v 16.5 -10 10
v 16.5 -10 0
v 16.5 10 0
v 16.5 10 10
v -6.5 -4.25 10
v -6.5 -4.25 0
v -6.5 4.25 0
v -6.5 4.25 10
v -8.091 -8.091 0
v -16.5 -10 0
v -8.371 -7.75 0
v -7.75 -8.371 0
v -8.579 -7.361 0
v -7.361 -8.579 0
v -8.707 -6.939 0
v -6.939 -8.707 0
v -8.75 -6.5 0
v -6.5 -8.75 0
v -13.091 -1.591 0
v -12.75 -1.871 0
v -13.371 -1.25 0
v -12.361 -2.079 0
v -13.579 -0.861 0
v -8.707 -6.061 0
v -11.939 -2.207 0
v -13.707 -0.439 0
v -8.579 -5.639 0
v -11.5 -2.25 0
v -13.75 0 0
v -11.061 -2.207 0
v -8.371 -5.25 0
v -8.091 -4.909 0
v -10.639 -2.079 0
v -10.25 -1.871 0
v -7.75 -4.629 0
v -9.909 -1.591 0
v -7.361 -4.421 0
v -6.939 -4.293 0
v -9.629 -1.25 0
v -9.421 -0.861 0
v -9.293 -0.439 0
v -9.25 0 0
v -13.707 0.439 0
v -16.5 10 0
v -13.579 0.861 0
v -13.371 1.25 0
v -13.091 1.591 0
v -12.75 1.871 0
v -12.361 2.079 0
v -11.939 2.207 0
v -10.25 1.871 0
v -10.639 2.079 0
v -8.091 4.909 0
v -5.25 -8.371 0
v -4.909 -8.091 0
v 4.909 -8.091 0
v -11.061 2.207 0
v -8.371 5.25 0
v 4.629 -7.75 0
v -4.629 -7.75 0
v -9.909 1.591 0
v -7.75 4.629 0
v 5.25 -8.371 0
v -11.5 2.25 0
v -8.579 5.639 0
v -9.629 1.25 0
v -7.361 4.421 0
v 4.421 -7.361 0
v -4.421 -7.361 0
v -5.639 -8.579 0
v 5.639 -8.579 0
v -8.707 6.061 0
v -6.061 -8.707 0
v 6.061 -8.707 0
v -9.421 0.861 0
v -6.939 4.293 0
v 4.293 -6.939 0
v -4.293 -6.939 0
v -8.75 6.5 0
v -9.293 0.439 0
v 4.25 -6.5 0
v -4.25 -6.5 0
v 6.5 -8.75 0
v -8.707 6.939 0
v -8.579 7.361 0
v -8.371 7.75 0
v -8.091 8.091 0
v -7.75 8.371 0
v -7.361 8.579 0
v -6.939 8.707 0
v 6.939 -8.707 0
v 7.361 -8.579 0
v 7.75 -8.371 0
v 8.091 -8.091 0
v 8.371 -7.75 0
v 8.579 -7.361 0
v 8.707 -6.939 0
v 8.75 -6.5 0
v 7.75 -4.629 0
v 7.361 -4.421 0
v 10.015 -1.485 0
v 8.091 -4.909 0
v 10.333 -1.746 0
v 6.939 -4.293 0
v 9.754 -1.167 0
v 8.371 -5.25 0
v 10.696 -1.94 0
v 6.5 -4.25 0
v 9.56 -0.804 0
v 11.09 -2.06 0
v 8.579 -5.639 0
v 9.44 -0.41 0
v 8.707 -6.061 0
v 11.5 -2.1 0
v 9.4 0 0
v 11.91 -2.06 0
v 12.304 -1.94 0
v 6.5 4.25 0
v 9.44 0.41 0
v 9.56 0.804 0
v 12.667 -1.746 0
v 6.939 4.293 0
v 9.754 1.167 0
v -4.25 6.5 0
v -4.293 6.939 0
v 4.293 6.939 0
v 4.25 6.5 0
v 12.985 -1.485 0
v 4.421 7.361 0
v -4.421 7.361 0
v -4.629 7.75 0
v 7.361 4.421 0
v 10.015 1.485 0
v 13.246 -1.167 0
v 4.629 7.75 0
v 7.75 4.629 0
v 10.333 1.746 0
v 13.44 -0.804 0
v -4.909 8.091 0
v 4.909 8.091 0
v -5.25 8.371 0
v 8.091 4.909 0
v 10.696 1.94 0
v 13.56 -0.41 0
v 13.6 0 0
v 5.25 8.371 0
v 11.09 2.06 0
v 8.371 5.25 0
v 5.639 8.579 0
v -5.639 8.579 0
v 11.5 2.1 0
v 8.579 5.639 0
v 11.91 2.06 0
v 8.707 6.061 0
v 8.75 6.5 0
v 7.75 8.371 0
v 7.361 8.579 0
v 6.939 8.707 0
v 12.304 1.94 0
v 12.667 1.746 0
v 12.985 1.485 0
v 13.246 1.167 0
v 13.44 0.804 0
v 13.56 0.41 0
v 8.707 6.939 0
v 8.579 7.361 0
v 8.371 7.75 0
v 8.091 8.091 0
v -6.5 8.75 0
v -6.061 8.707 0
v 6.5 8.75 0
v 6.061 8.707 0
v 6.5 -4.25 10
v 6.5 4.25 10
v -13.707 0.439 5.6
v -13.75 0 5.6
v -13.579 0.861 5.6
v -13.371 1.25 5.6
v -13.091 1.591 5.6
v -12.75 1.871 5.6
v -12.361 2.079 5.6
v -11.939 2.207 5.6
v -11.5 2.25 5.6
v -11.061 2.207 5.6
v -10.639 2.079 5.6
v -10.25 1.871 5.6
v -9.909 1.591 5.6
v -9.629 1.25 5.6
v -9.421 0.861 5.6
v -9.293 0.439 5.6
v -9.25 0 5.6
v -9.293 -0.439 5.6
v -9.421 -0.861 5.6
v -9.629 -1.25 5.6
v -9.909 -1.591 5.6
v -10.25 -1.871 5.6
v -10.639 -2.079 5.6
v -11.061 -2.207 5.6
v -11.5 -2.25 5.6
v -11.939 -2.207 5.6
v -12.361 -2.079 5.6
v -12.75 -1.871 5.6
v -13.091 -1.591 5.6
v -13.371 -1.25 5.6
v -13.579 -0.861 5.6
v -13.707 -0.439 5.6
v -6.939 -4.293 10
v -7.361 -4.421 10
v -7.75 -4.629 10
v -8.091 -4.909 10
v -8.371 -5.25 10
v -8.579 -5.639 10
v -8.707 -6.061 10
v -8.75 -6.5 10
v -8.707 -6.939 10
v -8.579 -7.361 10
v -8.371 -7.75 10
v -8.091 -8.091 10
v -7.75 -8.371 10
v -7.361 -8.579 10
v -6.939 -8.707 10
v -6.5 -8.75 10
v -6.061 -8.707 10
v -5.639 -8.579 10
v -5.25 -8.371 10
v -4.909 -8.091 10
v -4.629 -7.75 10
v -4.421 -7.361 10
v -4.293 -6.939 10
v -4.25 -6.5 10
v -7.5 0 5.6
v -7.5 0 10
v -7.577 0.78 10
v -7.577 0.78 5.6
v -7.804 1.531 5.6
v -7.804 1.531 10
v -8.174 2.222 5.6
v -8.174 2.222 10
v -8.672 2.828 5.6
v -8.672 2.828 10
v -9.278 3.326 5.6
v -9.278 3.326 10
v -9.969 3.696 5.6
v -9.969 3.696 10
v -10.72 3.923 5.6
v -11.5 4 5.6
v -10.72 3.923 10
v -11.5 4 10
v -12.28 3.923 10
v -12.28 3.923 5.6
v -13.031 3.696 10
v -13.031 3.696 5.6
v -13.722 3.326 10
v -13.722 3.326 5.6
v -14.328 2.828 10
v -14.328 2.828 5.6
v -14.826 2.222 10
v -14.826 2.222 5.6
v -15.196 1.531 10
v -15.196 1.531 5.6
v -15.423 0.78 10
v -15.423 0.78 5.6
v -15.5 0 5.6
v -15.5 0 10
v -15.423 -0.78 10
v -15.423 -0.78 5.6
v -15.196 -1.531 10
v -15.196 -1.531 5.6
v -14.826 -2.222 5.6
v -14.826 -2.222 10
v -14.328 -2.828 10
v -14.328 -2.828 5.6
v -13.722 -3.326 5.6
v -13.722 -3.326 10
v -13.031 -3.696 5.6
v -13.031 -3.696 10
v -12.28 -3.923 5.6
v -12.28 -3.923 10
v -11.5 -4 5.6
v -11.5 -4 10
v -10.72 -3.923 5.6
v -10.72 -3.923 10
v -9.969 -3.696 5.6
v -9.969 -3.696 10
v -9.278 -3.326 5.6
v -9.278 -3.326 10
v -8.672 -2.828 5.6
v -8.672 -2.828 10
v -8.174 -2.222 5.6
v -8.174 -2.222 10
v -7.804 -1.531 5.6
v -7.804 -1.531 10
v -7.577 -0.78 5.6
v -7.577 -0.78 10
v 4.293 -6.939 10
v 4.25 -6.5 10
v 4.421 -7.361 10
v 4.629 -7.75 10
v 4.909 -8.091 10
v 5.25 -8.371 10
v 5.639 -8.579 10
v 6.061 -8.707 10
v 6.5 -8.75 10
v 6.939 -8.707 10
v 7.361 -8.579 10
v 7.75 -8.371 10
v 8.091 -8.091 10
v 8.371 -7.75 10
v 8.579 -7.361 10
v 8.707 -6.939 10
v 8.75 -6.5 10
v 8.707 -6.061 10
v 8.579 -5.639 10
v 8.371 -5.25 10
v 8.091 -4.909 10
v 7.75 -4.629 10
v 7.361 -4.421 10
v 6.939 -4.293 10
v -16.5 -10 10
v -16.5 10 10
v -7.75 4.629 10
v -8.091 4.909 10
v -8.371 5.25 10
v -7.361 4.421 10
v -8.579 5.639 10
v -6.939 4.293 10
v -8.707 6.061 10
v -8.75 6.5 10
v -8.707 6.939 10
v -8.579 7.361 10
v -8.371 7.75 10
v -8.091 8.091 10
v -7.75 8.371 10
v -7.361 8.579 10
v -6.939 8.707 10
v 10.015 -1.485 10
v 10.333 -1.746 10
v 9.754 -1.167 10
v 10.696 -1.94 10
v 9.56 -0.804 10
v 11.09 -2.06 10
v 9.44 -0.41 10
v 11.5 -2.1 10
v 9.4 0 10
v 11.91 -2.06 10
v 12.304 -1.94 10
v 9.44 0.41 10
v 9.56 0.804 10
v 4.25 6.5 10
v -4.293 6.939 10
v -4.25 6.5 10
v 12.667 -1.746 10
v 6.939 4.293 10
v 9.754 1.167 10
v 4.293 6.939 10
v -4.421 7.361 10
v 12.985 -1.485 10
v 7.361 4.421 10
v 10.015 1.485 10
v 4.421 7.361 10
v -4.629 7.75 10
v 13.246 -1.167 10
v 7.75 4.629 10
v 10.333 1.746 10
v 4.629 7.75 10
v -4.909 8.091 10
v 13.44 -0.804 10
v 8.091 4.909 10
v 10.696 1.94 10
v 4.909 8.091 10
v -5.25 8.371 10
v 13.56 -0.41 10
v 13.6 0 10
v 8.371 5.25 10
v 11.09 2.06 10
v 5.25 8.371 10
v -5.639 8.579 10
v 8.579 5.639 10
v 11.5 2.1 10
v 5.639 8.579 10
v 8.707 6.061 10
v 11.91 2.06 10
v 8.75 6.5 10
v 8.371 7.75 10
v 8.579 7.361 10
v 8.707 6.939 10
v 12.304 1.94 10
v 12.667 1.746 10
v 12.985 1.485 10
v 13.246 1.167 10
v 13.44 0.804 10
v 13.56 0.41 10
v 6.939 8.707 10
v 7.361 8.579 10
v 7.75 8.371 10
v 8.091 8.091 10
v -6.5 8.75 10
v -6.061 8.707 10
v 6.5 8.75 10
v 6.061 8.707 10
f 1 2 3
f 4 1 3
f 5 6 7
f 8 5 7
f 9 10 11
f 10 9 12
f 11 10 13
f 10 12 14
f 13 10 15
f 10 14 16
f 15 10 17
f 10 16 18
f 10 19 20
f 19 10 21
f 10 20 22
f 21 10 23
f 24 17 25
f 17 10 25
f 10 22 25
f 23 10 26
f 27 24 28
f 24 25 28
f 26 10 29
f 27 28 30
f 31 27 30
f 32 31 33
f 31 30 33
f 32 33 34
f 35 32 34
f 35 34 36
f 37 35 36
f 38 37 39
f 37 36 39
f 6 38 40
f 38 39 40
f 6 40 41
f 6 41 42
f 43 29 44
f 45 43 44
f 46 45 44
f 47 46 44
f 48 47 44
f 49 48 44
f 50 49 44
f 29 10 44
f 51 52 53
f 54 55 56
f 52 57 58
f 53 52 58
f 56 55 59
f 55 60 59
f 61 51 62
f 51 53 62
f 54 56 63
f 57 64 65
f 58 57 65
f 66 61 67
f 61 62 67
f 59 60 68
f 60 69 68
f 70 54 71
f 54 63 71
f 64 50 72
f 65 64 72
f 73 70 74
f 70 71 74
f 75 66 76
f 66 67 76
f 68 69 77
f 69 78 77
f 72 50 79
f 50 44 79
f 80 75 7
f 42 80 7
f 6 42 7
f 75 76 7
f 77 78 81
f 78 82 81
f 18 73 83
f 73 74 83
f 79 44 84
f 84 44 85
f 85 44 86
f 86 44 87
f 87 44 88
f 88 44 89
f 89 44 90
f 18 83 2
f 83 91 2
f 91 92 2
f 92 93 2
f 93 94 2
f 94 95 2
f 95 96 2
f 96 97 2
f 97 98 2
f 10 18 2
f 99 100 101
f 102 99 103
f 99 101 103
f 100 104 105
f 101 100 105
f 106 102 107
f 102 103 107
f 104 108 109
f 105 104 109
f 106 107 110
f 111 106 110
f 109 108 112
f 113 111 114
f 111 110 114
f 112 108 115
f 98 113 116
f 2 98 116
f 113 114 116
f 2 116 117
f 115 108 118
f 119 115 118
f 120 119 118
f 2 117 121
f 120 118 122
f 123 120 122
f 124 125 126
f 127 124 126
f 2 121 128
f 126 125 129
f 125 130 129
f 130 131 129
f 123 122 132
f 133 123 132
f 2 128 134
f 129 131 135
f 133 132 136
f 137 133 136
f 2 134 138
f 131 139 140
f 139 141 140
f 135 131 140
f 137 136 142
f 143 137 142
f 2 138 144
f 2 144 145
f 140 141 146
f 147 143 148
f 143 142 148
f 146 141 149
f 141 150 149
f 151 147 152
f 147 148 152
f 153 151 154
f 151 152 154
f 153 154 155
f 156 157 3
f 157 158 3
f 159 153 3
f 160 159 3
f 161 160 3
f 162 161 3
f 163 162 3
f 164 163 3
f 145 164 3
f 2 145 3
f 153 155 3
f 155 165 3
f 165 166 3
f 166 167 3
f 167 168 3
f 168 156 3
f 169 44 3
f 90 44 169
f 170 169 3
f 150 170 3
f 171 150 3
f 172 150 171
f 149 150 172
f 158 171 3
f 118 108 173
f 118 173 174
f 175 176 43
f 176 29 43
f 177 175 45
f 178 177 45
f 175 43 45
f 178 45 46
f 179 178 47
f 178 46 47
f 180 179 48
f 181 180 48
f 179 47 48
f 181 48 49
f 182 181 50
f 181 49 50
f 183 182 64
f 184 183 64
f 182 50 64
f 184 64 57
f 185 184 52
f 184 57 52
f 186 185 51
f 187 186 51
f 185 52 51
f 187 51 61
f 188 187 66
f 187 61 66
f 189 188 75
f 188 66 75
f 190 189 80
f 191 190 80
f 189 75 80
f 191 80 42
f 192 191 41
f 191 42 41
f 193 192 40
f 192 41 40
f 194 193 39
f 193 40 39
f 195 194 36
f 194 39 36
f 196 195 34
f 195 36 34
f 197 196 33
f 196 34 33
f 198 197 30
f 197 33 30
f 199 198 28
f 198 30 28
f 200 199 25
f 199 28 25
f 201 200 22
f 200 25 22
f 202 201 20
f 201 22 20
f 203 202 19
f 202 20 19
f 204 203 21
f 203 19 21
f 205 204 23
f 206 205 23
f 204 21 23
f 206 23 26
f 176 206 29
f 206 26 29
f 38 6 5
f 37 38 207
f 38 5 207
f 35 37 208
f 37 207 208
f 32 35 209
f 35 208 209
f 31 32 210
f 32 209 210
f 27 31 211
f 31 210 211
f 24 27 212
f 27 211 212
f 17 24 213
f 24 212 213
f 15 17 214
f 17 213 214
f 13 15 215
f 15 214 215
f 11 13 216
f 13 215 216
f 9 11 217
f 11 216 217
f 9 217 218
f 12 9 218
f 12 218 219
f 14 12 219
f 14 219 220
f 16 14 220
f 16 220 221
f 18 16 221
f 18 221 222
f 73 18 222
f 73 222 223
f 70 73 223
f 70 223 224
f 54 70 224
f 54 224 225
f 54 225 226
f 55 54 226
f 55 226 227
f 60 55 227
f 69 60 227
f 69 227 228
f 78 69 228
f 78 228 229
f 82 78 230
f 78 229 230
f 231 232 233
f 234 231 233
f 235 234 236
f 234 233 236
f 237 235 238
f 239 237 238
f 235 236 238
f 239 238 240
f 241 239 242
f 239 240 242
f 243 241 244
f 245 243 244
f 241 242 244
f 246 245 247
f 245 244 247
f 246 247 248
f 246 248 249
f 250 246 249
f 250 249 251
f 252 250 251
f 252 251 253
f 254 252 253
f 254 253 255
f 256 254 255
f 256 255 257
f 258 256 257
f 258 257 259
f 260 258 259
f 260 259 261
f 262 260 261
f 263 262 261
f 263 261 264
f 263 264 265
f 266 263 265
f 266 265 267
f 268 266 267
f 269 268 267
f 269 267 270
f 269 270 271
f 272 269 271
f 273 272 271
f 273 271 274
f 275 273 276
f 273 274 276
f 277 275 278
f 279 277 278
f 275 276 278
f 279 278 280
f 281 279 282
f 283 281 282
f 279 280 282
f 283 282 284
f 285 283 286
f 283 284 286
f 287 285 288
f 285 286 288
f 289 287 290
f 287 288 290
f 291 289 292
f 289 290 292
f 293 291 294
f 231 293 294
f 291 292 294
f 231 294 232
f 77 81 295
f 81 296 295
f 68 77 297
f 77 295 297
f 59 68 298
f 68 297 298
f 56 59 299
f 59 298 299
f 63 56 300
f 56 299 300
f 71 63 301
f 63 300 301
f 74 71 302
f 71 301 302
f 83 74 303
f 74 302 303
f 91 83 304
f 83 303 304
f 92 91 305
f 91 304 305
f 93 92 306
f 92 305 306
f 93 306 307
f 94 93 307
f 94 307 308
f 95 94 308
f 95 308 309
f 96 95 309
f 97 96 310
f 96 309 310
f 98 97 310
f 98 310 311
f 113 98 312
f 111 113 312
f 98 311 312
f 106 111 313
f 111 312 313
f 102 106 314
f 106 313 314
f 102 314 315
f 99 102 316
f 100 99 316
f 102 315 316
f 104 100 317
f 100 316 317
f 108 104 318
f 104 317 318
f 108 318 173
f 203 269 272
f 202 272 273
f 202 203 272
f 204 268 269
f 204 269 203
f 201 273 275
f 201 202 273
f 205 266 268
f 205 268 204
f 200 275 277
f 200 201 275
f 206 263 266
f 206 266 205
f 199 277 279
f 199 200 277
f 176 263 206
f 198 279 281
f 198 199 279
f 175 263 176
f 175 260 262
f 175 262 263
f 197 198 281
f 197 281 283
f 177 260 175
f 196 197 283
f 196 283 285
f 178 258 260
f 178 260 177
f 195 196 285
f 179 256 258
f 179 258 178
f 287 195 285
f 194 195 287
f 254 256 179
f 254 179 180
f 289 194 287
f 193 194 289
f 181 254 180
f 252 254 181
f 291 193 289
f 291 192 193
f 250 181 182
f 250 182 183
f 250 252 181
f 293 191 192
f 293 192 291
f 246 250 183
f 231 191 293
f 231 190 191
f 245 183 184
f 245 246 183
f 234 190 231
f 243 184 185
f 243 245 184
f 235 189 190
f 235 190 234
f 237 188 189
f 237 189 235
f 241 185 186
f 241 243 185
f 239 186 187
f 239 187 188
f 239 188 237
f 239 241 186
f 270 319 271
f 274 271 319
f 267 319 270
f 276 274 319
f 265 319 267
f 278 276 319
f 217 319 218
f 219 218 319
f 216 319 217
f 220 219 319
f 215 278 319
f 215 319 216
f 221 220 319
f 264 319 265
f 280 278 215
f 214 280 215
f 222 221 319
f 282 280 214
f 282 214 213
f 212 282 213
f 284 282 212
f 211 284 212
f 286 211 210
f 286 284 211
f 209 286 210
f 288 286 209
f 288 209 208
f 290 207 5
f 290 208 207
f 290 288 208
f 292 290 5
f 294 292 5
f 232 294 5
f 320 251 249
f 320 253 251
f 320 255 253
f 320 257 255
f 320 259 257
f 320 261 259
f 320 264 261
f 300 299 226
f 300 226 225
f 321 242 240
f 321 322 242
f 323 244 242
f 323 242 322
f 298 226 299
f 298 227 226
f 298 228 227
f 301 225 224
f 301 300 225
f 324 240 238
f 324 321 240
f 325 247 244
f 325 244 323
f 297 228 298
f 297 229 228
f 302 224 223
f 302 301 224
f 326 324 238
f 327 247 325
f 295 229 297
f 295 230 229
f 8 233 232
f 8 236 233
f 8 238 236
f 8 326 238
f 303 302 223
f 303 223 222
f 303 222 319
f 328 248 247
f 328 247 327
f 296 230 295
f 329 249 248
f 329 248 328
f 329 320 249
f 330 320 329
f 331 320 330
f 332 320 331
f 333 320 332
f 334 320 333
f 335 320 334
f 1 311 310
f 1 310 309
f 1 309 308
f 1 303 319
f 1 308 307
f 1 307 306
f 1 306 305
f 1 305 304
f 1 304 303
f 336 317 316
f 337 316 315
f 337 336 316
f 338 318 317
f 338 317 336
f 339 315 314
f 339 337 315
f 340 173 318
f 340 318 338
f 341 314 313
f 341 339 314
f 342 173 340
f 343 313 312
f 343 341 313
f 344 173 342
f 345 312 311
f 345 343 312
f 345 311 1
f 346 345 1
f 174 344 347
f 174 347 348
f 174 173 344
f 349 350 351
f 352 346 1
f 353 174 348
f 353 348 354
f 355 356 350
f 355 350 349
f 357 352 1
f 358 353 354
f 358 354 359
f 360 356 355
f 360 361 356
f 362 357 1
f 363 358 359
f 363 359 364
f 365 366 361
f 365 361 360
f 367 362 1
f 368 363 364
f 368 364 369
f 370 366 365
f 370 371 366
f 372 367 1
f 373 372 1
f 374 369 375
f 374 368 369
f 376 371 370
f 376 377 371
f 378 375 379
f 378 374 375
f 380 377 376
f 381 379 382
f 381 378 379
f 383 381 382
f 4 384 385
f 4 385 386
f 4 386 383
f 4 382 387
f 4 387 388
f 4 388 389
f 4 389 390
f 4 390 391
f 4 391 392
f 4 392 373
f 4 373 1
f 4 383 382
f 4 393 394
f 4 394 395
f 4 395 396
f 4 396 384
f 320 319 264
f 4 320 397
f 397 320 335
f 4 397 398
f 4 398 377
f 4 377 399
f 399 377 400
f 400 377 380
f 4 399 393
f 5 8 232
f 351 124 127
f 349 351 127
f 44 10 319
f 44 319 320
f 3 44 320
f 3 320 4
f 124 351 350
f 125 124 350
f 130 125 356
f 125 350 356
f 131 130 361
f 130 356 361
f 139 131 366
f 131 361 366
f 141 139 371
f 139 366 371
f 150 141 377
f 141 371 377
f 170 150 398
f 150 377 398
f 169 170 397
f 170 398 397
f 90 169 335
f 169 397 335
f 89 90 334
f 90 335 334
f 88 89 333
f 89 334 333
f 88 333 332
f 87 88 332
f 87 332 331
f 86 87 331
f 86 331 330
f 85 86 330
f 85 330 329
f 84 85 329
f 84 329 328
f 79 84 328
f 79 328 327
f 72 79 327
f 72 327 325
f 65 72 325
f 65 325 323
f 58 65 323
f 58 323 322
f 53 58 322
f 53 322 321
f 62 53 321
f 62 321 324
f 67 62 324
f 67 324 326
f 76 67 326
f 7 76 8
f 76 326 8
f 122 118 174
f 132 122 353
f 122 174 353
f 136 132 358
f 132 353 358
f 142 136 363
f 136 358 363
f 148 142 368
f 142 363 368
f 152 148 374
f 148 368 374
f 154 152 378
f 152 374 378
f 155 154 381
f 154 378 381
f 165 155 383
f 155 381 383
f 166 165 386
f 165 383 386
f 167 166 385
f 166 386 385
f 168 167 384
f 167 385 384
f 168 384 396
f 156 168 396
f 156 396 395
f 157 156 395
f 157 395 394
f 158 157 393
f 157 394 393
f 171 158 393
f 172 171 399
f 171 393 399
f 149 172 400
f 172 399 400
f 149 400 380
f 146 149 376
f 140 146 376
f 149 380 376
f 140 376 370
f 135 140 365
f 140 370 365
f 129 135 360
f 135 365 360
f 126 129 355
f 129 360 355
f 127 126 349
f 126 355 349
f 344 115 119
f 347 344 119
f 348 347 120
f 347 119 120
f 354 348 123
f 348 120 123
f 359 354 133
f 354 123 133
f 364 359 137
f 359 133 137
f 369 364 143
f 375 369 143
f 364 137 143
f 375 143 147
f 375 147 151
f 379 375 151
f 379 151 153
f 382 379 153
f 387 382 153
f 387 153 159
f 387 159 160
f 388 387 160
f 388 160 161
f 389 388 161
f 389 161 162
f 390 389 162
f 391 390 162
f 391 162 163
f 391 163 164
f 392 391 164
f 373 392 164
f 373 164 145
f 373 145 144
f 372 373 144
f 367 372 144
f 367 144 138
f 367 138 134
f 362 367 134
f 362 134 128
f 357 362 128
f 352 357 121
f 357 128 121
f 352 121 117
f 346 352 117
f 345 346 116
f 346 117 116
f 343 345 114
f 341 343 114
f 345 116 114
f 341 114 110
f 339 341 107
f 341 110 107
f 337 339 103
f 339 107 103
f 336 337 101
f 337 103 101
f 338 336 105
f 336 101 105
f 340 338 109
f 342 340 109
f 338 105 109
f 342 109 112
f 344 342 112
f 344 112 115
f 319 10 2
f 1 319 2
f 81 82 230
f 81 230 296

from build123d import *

# Parameters (mm, degrees)
SKIZZE1_W                                            = 33
SKIZZE1_H                                            = 20
SKIZZE1_W_2                                          = 13
SKIZZE1_H_2                                          = 13
AUFSATZ_LINEAR_AUSTRAGEN1_DEPTH                      = 10
STIRNSENKUNG_F_R_M4_ZYLINDERSCHRAUBE_MIT_D           = 4.5
STIRNSENKUNG_F_R_M4_ZYLINDERSCHRAUBE_MIT_CBORE_D     = 8
STIRNSENKUNG_F_R_M4_ZYLINDERSCHRAUBE_MIT_CBORE_DEPTH = 4.4
SKIZZE8_R                                            = 2.25
SCHNITT_LINEAR_AUSTRAGEN1_DEPTH                      = 11
M5_GEWINDEBOHRUNG1_D                                 = 4.2


with BuildPart() as part:
    # Skizze1 → Aufsatz-Linear austragen1 (new body)
    with BuildSketch(Plane.XY):
        Rectangle(SKIZZE1_W, SKIZZE1_H)
        Rectangle(SKIZZE1_W_2, SKIZZE1_H_2, mode=Mode.SUBTRACT)
    extrude(amount=AUFSATZ_LINEAR_AUSTRAGEN1_DEPTH)

    # Stirnsenkung für M4 Zylinderschraube mit Innensechskant1 (through all)
    with Locations(Plane.XY.offset(10)):
        with Locations((-11.5, 0)):
            CounterBoreHole(STIRNSENKUNG_F_R_M4_ZYLINDERSCHRAUBE_MIT_D / 2, STIRNSENKUNG_F_R_M4_ZYLINDERSCHRAUBE_MIT_CBORE_D / 2, STIRNSENKUNG_F_R_M4_ZYLINDERSCHRAUBE_MIT_CBORE_DEPTH)

    # Skizze8 → Schnitt-Linear austragen1 (cut, through all)
    with BuildSketch(Plane.XY.offset(10)):
        with Locations((-6.5, 6.5)):
            Circle(SKIZZE8_R)
        with Locations((-6.5, -6.5)):
            Circle(SKIZZE8_R)
        with Locations((6.5, -6.5)):
            Circle(SKIZZE8_R)
        with Locations((6.5, 6.5)):
            Circle(SKIZZE8_R)
    extrude(amount=-SCHNITT_LINEAR_AUSTRAGEN1_DEPTH, mode=Mode.SUBTRACT)

    # M5 Gewindebohrung1 (through all)
    with Locations(Plane.XY.offset(10)):
        with Locations((11.5, 0)):
            Hole(M5_GEWINDEBOHRUNG1_D / 2)


solid = part.part
